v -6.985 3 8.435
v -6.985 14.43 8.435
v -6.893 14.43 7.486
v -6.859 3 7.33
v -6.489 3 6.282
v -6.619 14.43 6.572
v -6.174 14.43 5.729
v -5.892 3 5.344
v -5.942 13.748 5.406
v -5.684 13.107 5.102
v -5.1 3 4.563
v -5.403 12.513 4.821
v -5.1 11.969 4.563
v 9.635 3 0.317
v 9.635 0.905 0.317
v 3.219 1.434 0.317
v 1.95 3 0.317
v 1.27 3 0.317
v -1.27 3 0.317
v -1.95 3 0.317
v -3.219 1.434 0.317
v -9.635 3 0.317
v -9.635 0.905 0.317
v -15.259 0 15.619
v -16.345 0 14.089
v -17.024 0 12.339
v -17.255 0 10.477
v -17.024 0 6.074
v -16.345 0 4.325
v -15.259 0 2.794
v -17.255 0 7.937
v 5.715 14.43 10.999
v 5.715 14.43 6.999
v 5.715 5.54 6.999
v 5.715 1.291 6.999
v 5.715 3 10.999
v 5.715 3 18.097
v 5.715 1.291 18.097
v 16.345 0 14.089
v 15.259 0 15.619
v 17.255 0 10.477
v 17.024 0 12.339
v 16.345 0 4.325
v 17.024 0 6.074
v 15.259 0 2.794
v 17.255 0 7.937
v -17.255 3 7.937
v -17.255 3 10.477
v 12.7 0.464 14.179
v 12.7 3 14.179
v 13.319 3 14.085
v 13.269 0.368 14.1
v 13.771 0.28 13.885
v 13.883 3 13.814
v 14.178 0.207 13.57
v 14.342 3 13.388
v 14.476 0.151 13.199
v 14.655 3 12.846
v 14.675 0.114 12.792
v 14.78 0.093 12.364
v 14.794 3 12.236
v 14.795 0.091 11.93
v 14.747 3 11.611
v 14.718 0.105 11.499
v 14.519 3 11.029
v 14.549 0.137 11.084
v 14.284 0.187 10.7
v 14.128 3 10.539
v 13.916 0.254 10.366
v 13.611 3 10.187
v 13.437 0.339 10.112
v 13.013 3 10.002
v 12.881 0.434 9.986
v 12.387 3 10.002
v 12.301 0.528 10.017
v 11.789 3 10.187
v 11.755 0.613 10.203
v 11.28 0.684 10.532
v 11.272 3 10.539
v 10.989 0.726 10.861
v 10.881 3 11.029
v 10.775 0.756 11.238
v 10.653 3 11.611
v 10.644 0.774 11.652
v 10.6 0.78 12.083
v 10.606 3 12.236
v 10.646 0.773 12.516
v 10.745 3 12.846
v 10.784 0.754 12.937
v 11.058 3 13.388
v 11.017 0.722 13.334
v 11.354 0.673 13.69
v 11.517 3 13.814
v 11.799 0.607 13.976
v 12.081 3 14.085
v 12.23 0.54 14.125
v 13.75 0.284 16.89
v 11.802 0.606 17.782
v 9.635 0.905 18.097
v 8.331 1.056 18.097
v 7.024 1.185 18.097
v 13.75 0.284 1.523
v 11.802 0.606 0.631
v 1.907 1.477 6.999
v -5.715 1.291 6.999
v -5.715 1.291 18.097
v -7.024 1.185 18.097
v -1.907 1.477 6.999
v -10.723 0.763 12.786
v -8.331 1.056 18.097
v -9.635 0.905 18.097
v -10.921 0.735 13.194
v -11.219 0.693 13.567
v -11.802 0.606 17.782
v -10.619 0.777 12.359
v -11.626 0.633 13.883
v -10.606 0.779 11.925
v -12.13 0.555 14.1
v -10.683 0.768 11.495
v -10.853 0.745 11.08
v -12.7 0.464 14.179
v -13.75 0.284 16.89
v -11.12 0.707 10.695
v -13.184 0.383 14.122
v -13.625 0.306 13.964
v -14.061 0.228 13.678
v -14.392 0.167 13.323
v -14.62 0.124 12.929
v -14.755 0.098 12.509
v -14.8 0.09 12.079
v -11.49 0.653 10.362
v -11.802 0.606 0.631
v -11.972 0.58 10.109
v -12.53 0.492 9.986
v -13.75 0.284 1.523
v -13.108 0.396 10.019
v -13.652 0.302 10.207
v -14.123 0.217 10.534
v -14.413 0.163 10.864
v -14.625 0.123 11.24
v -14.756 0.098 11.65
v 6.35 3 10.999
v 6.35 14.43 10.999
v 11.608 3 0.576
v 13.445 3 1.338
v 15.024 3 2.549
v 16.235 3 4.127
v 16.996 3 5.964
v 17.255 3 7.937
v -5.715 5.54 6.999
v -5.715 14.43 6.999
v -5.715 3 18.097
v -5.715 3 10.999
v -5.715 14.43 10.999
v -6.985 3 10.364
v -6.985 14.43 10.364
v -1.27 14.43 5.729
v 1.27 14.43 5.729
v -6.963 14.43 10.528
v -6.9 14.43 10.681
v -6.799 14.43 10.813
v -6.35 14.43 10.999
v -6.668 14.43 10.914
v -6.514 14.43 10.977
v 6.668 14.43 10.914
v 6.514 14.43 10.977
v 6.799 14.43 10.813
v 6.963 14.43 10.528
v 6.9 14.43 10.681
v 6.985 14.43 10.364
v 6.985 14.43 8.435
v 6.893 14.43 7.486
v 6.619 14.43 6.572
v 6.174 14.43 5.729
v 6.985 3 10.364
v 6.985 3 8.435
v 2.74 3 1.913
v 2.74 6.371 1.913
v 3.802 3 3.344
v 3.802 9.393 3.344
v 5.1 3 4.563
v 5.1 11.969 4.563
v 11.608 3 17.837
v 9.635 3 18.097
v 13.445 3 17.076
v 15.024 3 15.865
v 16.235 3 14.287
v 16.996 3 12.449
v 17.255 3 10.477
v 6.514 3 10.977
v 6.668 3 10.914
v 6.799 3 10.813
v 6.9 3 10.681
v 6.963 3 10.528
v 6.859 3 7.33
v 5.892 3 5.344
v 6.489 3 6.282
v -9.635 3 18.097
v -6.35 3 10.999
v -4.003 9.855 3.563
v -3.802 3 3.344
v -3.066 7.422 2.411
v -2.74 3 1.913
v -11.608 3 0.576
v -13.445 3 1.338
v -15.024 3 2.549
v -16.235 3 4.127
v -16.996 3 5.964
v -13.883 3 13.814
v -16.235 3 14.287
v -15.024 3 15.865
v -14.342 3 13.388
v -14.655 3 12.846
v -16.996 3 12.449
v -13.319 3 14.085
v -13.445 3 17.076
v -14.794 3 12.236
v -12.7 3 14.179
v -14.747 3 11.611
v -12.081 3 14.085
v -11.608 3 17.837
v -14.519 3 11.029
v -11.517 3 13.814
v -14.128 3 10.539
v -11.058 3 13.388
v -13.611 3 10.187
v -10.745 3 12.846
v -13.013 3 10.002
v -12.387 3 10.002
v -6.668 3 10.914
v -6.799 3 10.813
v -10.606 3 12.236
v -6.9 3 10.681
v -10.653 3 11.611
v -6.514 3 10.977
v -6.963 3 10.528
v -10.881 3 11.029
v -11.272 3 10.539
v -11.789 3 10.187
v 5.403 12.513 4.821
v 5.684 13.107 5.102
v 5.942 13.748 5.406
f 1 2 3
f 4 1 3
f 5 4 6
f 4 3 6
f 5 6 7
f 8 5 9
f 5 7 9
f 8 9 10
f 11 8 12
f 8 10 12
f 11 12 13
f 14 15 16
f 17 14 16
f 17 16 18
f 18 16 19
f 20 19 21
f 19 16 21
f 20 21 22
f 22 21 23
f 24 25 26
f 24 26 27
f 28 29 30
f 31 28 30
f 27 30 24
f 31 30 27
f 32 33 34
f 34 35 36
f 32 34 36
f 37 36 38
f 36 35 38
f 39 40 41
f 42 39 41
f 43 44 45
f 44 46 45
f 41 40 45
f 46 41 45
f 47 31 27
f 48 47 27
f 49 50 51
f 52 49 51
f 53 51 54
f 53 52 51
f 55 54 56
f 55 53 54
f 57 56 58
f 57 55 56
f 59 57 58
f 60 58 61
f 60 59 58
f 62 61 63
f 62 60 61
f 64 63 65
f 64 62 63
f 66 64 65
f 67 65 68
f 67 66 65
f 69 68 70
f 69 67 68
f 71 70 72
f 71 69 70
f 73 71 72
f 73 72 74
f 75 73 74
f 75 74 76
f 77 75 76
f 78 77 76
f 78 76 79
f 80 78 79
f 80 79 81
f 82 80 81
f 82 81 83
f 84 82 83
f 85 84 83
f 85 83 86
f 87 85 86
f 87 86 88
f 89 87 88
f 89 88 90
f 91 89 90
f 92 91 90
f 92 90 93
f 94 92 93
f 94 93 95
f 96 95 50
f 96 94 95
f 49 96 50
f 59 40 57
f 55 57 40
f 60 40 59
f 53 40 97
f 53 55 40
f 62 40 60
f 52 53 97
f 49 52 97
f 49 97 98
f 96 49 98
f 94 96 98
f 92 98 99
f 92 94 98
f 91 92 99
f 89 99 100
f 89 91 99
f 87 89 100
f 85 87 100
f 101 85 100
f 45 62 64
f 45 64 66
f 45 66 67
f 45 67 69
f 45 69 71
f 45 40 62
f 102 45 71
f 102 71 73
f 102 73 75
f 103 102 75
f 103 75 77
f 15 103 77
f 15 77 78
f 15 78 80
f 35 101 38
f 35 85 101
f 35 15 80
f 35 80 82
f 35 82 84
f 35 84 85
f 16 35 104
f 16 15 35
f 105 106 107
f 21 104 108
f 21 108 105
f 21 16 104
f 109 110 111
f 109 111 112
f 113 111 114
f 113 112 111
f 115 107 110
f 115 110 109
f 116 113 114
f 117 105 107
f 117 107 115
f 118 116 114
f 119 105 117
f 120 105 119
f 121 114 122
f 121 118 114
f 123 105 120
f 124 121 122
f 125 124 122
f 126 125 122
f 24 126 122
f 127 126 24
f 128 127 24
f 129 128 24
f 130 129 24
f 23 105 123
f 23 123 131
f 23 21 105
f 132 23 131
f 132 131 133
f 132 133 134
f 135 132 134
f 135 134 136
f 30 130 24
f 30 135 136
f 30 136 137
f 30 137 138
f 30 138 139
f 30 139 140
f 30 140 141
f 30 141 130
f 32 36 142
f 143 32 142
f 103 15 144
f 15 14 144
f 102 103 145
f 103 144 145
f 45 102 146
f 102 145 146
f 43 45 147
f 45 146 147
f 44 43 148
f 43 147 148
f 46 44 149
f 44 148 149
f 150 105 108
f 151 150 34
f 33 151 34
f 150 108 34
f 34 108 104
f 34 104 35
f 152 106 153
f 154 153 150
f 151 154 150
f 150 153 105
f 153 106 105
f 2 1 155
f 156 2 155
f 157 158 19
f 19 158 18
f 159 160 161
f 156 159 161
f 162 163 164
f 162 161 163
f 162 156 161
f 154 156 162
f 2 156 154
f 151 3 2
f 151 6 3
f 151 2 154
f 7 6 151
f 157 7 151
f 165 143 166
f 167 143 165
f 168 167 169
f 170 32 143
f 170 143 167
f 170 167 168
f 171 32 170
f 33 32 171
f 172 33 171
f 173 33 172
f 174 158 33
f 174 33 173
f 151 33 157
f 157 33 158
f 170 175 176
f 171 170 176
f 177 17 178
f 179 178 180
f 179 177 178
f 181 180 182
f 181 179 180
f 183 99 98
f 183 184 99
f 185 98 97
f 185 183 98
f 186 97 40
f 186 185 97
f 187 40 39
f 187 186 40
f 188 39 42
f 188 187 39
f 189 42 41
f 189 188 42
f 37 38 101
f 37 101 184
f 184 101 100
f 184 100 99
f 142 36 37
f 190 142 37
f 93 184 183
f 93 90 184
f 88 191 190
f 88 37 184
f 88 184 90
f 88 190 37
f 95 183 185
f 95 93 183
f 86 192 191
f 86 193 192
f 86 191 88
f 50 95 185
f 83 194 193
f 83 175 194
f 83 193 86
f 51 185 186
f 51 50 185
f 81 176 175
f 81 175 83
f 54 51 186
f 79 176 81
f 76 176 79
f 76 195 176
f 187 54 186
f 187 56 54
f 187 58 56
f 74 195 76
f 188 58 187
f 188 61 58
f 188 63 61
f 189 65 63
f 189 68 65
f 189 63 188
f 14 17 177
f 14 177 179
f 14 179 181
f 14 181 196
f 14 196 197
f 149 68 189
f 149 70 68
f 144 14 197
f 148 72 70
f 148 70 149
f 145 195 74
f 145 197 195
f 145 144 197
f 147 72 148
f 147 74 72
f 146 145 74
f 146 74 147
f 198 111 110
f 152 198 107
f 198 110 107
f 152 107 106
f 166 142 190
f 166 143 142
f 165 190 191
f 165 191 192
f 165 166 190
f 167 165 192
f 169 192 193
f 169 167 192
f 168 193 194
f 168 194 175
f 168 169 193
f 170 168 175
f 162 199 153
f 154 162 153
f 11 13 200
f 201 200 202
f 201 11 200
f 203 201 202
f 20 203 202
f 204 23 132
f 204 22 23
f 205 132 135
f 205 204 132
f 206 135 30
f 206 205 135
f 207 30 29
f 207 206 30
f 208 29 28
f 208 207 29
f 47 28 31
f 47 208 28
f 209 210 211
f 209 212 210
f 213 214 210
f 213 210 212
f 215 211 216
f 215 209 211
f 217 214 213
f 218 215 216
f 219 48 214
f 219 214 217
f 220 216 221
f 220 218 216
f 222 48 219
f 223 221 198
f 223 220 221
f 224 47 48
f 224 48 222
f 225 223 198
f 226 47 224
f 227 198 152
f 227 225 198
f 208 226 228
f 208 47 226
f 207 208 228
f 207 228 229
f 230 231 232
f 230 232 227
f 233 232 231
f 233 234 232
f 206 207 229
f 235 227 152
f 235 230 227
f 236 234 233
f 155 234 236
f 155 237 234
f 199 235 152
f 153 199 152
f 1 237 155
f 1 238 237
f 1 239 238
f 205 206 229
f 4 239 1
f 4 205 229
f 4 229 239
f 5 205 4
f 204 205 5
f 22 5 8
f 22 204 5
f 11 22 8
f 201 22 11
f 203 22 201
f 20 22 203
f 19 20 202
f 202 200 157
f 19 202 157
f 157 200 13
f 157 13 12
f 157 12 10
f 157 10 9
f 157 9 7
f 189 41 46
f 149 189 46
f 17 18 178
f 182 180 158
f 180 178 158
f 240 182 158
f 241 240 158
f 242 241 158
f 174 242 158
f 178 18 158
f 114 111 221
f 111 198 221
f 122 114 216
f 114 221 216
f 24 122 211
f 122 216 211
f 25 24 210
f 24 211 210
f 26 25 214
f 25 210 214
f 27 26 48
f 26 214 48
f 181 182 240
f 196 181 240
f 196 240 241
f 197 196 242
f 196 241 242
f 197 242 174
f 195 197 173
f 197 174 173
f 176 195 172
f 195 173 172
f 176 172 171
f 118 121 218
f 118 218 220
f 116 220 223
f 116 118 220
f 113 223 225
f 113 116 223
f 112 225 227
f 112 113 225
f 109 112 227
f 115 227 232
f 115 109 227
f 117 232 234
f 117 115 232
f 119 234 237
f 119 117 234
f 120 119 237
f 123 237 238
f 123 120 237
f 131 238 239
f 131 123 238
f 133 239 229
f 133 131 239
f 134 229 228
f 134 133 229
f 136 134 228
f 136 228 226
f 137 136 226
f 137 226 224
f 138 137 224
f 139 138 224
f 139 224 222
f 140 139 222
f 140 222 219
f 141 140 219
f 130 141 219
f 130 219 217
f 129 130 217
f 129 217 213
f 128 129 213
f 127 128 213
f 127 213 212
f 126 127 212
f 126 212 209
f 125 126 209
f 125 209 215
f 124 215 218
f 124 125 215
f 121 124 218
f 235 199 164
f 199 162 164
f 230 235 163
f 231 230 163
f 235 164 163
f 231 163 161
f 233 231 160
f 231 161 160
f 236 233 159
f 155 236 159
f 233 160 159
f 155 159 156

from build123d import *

# Parameters (mm, degrees)
SKETCH1_R               = 2.1
SKETCH1_W               = 1.815
SKETCH1_H               = 1
SKETCH1_H_2             = 3
BOSS_EXTRUDE1_DEPTH     = 3
BOSS_EXTRUDE2_START     = 3
SKETCH1_8_W             = 1.815
SKETCH1_8_H             = 1
BOSS_EXTRUDE2_DEPTH     = 11.43
CUT_EXTRUDE2_DEPTH      = 29.869778286
CUT_EXTRUDE2_DEPTH_BACK = 29.869778286
SKETCH2_R               = 78.359
CHAMFER1_SIZE           = 2.54
BOSS_EXTRUDE3_DEPTH     = 1.27
FILLET1_R               = 7.62
FILLET5_R               = 10
FILLET6_R               = 4.92
SKETCH7_W               = 11.43
SKETCH7_H               = 5.433942037
CUT_EXTRUDE4_DEPTH      = 29.869778458
FILLET7_R               = 0.635


with BuildPart() as part:
    # Sketch1 → Boss-Extrude1 (new body)
    # profile 1 of 6: a face of its own
    with BuildSketch(Plane(origin=(0, 0, 0), x_dir=(1, 0, 0), z_dir=(0, 1, 0))):
        Polygon((6.985, -10.998674064), (5.715, -10.998674064), (5.715, -15.888674064), (5.715, -18.096674099), (17.255421897, -18.096674099), (17.255421897, -0.316674099), (-17.255421897, -0.316674099), (-17.255421897, -18.096674099), (-5.715, -18.096674099), (-5.715, -15.888674064), (-5.715, -10.998674064), (-6.985, -10.998674064), (-6.985, -5.728674064), (6.985, -5.728674064), align=None)
        with Locations(Location((-12.7, -12.078674064, 0), (0, 0, 270))):
            Circle(SKETCH1_R, mode=Mode.SUBTRACT)
        with Locations(Location((12.7, -12.078674064, 0), (0, 0, 270))):
            Circle(SKETCH1_R, mode=Mode.SUBTRACT)
    # profile 2 of 6: a face of its own
    with BuildSketch(Plane(origin=(0, 0, 0), x_dir=(1, 0, 0), z_dir=(0, 1, 0))):
        Polygon((5.715, -9.998674064), (5.715, -10.998674064), (6.985, -10.998674064), (6.985, -5.728674064), (-6.985, -5.728674064), (-6.985, -10.998674064), (-5.715, -10.998674064), (-5.715, -9.998674064), (-5.715, -6.998674064), (-3.9, -6.998674064), (3.9, -6.998674064), (5.715, -6.998674064), align=None)
    # profile 3 of 6: a face of its own
    with BuildSketch(Plane(origin=(0, 0, 0), x_dir=(1, 0, 0), z_dir=(0, 1, 0))):
        with Locations((-4.8075, -10.498674064)):
            Rectangle(SKETCH1_W, SKETCH1_H)
    # profile 4 of 6: a face of its own
    with BuildSketch(Plane(origin=(0, 0, 0), x_dir=(1, 0, 0), z_dir=(0, 1, 0))):
        with Locations((-4.8075, -8.498674064)):
            Rectangle(SKETCH1_W, SKETCH1_H_2)
    # profile 5 of 6: a face of its own
    with BuildSketch(Plane(origin=(0, 0, 0), x_dir=(1, 0, 0), z_dir=(0, 1, 0))):
        with Locations((4.8075, -8.498674064)):
            Rectangle(SKETCH1_W, SKETCH1_H_2)
    # profile 6 of 6: a face of its own
    with BuildSketch(Plane(origin=(0, 0, 0), x_dir=(1, 0, 0), z_dir=(0, 1, 0))):
        with Locations((4.8075, -10.498674064)):
            Rectangle(SKETCH1_W, SKETCH1_H)
    extrude(amount=BOSS_EXTRUDE1_DEPTH)

    # Sketch1<8> → Boss-Extrude2 (add)
    with BuildSketch(Plane(origin=(0, 0, 0), x_dir=(1, 0, 0), z_dir=(0, 1, 0)).offset(BOSS_EXTRUDE2_START)):
        Polygon((5.715, -9.998674064), (5.715, -10.998674064), (6.985, -10.998674064), (6.985, -5.728674064), (-6.985, -5.728674064), (-6.985, -10.998674064), (-5.715, -10.998674064), (-5.715, -9.998674064), (-5.715, -6.998674064), (-3.9, -6.998674064), (3.9, -6.998674064), (5.715, -6.998674064), align=None)
        with Locations((4.8075, -10.498674064)):
            Rectangle(SKETCH1_8_W, SKETCH1_8_H)
        with Locations((-4.8075, -10.498674064)):
            Rectangle(SKETCH1_8_W, SKETCH1_8_H)
    extrude(amount=BOSS_EXTRUDE2_DEPTH)

    # Sketch2 → Cut-Extrude2 (cut, two sides: drawn at the far end of the back side and taken through both)
    with BuildSketch(Plane.XY.offset(-CUT_EXTRUDE2_DEPTH_BACK)):
        with Locations((0, -76.858999952)):
            Circle(SKETCH2_R)
    extrude(amount=CUT_EXTRUDE2_DEPTH + CUT_EXTRUDE2_DEPTH_BACK, mode=Mode.SUBTRACT)

    # Chamfer1
    # the kernel refuses this chamfer: 2.54 mm, written as the material it adds along each edge
    with BuildSketch(Plane(origin=(5.715, 3, 6.998674064), x_dir=(0.027495876610586268, 0.9996219169112968, 0), z_dir=(0, 0, 1))) as chamfer1_piece_1_section:
        Polygon((CHAMFER1_SIZE * 0.999621916911, CHAMFER1_SIZE * 0.0274958766106), (-CHAMFER1_SIZE * 0.0274958766106, CHAMFER1_SIZE * 0.999621916911), (0, 0), align=None)
    chamfer1_piece_1 = extrude(amount=3, mode=Mode.PRIVATE)
    chamfer1_piece_1 = split(chamfer1_piece_1, bisect_by=Plane(origin=(3.9, 3.90032925, 8.498674064), z_dir=(1, 0, 0)), keep=Keep.TOP, mode=Mode.PRIVATE)
    add(chamfer1_piece_1)
    with BuildSketch(Plane(origin=(-5.715, 3, 9.998674064), x_dir=(-0.027495876610586268, 0.9996219169112968, 0), z_dir=(0, 0, -1))) as chamfer1_piece_2_section:
        Polygon((CHAMFER1_SIZE * 0.999621916911, CHAMFER1_SIZE * 0.0274958766106), (-CHAMFER1_SIZE * 0.0274958766106, CHAMFER1_SIZE * 0.999621916911), (0, 0), align=None)
    chamfer1_piece_2 = extrude(amount=3, mode=Mode.PRIVATE)
    chamfer1_piece_2 = split(chamfer1_piece_2, bisect_by=Plane(origin=(-3.9, 3.90032925, 8.498674064), z_dir=(-1, 0, 0)), keep=Keep.TOP, mode=Mode.PRIVATE)
    add(chamfer1_piece_2)

    # Sketch6 → Boss-Extrude3 (add, symmetric)
    with BuildSketch(Plane(origin=(0, 0, 0), x_dir=(0, 0, -1), z_dir=(1, 0, 0))):
        Polygon((-5.728674064, 14.43), (-0.316674099, 3), (-5.728674064, 3), align=None)
    extrude(amount=BOSS_EXTRUDE3_DEPTH, both=True)

    # Fillet1
    fillet1_edges = [part.edges().sort_by_distance(p)[0] for p in [
        (-17.255421897, 1.5, 0.316674099),
        (17.255421897, 1.5, 0.316674099),
        (17.255421897, 1.5, 18.096674099),
        (-17.255421897, 1.5, 18.096674099),
    ]]
    fillet(fillet1_edges, radius=FILLET1_R)

    # Fillet5
    # the kernel refuses this fillet: 10 mm, written as the material it adds along each edge
    with BuildSketch(Plane(origin=(-1.27, 3, 5.728674064), x_dir=(-1, 0, 0), z_dir=(0, 1, 0))) as fillet5_piece_1_section:
        with BuildLine():
            CenterArc((10, -9.03541781), FILLET5_R, 115.372403981, 64.627596019)
            Line((0, -9.03541781), (0, 0))
            Line((0, 0), (5.715, 0))
        make_face()
    fillet5_piece_1 = extrude(amount=34.018544525, mode=Mode.PRIVATE)
    fillet5_piece_1 = split(fillet5_piece_1, bisect_by=Plane(origin=(-3.934188125, 8.906839934, 3.113508527), z_dir=(0, -0.42794357624145657, 0.9038054522703837)), keep=Keep.TOP, mode=Mode.PRIVATE)
    add(fillet5_piece_1)
    with BuildSketch(Plane(origin=(1.27, 3, 5.728674064), x_dir=(1, 0, 0), z_dir=(0, 1, 0))) as fillet5_piece_2_section:
        with BuildLine():
            CenterArc((10, 9.03541781), FILLET5_R, 180, 64.627596019)
            Line((0, 9.03541781), (0, 0))
            Line((0, 0), (5.715, 0))
        make_face()
    fillet5_piece_2 = extrude(amount=34.018544525, mode=Mode.PRIVATE)
    fillet5_piece_2 = split(fillet5_piece_2, bisect_by=Plane(origin=(3.934188125, 8.906839934, 3.113508527), z_dir=(0, -0.42794357624145657, 0.9038054522703837)), keep=Keep.TOP, mode=Mode.PRIVATE)
    add(fillet5_piece_2)

    # Fillet6
    fillet6_edges = [part.edges().sort_by_distance(p)[0] for p in [
        (6.985, 8.715, 5.728674064),
        (-6.985, 8.715, 5.728674064),
    ]]
    fillet(fillet6_edges, radius=FILLET6_R)

    # Sketch7 → Cut-Extrude4 (cut, through all)
    with BuildSketch(Plane(origin=(0, 14.43, 0), x_dir=(1, 0, 0), z_dir=(0, 1, 0))):
        with Locations((0, -9.715645083)):
            Rectangle(SKETCH7_W, SKETCH7_H)
    extrude(amount=-CUT_EXTRUDE4_DEPTH, mode=Mode.SUBTRACT)

    # Fillet7
    fillet7_edges = [part.edges().sort_by_distance(p)[0] for p in [
        (6.985, 8.715, 10.998674064),
        (-6.985, 8.715, 10.998674064),
    ]]
    fillet(fillet7_edges, radius=FILLET7_R)


solid = part.part
